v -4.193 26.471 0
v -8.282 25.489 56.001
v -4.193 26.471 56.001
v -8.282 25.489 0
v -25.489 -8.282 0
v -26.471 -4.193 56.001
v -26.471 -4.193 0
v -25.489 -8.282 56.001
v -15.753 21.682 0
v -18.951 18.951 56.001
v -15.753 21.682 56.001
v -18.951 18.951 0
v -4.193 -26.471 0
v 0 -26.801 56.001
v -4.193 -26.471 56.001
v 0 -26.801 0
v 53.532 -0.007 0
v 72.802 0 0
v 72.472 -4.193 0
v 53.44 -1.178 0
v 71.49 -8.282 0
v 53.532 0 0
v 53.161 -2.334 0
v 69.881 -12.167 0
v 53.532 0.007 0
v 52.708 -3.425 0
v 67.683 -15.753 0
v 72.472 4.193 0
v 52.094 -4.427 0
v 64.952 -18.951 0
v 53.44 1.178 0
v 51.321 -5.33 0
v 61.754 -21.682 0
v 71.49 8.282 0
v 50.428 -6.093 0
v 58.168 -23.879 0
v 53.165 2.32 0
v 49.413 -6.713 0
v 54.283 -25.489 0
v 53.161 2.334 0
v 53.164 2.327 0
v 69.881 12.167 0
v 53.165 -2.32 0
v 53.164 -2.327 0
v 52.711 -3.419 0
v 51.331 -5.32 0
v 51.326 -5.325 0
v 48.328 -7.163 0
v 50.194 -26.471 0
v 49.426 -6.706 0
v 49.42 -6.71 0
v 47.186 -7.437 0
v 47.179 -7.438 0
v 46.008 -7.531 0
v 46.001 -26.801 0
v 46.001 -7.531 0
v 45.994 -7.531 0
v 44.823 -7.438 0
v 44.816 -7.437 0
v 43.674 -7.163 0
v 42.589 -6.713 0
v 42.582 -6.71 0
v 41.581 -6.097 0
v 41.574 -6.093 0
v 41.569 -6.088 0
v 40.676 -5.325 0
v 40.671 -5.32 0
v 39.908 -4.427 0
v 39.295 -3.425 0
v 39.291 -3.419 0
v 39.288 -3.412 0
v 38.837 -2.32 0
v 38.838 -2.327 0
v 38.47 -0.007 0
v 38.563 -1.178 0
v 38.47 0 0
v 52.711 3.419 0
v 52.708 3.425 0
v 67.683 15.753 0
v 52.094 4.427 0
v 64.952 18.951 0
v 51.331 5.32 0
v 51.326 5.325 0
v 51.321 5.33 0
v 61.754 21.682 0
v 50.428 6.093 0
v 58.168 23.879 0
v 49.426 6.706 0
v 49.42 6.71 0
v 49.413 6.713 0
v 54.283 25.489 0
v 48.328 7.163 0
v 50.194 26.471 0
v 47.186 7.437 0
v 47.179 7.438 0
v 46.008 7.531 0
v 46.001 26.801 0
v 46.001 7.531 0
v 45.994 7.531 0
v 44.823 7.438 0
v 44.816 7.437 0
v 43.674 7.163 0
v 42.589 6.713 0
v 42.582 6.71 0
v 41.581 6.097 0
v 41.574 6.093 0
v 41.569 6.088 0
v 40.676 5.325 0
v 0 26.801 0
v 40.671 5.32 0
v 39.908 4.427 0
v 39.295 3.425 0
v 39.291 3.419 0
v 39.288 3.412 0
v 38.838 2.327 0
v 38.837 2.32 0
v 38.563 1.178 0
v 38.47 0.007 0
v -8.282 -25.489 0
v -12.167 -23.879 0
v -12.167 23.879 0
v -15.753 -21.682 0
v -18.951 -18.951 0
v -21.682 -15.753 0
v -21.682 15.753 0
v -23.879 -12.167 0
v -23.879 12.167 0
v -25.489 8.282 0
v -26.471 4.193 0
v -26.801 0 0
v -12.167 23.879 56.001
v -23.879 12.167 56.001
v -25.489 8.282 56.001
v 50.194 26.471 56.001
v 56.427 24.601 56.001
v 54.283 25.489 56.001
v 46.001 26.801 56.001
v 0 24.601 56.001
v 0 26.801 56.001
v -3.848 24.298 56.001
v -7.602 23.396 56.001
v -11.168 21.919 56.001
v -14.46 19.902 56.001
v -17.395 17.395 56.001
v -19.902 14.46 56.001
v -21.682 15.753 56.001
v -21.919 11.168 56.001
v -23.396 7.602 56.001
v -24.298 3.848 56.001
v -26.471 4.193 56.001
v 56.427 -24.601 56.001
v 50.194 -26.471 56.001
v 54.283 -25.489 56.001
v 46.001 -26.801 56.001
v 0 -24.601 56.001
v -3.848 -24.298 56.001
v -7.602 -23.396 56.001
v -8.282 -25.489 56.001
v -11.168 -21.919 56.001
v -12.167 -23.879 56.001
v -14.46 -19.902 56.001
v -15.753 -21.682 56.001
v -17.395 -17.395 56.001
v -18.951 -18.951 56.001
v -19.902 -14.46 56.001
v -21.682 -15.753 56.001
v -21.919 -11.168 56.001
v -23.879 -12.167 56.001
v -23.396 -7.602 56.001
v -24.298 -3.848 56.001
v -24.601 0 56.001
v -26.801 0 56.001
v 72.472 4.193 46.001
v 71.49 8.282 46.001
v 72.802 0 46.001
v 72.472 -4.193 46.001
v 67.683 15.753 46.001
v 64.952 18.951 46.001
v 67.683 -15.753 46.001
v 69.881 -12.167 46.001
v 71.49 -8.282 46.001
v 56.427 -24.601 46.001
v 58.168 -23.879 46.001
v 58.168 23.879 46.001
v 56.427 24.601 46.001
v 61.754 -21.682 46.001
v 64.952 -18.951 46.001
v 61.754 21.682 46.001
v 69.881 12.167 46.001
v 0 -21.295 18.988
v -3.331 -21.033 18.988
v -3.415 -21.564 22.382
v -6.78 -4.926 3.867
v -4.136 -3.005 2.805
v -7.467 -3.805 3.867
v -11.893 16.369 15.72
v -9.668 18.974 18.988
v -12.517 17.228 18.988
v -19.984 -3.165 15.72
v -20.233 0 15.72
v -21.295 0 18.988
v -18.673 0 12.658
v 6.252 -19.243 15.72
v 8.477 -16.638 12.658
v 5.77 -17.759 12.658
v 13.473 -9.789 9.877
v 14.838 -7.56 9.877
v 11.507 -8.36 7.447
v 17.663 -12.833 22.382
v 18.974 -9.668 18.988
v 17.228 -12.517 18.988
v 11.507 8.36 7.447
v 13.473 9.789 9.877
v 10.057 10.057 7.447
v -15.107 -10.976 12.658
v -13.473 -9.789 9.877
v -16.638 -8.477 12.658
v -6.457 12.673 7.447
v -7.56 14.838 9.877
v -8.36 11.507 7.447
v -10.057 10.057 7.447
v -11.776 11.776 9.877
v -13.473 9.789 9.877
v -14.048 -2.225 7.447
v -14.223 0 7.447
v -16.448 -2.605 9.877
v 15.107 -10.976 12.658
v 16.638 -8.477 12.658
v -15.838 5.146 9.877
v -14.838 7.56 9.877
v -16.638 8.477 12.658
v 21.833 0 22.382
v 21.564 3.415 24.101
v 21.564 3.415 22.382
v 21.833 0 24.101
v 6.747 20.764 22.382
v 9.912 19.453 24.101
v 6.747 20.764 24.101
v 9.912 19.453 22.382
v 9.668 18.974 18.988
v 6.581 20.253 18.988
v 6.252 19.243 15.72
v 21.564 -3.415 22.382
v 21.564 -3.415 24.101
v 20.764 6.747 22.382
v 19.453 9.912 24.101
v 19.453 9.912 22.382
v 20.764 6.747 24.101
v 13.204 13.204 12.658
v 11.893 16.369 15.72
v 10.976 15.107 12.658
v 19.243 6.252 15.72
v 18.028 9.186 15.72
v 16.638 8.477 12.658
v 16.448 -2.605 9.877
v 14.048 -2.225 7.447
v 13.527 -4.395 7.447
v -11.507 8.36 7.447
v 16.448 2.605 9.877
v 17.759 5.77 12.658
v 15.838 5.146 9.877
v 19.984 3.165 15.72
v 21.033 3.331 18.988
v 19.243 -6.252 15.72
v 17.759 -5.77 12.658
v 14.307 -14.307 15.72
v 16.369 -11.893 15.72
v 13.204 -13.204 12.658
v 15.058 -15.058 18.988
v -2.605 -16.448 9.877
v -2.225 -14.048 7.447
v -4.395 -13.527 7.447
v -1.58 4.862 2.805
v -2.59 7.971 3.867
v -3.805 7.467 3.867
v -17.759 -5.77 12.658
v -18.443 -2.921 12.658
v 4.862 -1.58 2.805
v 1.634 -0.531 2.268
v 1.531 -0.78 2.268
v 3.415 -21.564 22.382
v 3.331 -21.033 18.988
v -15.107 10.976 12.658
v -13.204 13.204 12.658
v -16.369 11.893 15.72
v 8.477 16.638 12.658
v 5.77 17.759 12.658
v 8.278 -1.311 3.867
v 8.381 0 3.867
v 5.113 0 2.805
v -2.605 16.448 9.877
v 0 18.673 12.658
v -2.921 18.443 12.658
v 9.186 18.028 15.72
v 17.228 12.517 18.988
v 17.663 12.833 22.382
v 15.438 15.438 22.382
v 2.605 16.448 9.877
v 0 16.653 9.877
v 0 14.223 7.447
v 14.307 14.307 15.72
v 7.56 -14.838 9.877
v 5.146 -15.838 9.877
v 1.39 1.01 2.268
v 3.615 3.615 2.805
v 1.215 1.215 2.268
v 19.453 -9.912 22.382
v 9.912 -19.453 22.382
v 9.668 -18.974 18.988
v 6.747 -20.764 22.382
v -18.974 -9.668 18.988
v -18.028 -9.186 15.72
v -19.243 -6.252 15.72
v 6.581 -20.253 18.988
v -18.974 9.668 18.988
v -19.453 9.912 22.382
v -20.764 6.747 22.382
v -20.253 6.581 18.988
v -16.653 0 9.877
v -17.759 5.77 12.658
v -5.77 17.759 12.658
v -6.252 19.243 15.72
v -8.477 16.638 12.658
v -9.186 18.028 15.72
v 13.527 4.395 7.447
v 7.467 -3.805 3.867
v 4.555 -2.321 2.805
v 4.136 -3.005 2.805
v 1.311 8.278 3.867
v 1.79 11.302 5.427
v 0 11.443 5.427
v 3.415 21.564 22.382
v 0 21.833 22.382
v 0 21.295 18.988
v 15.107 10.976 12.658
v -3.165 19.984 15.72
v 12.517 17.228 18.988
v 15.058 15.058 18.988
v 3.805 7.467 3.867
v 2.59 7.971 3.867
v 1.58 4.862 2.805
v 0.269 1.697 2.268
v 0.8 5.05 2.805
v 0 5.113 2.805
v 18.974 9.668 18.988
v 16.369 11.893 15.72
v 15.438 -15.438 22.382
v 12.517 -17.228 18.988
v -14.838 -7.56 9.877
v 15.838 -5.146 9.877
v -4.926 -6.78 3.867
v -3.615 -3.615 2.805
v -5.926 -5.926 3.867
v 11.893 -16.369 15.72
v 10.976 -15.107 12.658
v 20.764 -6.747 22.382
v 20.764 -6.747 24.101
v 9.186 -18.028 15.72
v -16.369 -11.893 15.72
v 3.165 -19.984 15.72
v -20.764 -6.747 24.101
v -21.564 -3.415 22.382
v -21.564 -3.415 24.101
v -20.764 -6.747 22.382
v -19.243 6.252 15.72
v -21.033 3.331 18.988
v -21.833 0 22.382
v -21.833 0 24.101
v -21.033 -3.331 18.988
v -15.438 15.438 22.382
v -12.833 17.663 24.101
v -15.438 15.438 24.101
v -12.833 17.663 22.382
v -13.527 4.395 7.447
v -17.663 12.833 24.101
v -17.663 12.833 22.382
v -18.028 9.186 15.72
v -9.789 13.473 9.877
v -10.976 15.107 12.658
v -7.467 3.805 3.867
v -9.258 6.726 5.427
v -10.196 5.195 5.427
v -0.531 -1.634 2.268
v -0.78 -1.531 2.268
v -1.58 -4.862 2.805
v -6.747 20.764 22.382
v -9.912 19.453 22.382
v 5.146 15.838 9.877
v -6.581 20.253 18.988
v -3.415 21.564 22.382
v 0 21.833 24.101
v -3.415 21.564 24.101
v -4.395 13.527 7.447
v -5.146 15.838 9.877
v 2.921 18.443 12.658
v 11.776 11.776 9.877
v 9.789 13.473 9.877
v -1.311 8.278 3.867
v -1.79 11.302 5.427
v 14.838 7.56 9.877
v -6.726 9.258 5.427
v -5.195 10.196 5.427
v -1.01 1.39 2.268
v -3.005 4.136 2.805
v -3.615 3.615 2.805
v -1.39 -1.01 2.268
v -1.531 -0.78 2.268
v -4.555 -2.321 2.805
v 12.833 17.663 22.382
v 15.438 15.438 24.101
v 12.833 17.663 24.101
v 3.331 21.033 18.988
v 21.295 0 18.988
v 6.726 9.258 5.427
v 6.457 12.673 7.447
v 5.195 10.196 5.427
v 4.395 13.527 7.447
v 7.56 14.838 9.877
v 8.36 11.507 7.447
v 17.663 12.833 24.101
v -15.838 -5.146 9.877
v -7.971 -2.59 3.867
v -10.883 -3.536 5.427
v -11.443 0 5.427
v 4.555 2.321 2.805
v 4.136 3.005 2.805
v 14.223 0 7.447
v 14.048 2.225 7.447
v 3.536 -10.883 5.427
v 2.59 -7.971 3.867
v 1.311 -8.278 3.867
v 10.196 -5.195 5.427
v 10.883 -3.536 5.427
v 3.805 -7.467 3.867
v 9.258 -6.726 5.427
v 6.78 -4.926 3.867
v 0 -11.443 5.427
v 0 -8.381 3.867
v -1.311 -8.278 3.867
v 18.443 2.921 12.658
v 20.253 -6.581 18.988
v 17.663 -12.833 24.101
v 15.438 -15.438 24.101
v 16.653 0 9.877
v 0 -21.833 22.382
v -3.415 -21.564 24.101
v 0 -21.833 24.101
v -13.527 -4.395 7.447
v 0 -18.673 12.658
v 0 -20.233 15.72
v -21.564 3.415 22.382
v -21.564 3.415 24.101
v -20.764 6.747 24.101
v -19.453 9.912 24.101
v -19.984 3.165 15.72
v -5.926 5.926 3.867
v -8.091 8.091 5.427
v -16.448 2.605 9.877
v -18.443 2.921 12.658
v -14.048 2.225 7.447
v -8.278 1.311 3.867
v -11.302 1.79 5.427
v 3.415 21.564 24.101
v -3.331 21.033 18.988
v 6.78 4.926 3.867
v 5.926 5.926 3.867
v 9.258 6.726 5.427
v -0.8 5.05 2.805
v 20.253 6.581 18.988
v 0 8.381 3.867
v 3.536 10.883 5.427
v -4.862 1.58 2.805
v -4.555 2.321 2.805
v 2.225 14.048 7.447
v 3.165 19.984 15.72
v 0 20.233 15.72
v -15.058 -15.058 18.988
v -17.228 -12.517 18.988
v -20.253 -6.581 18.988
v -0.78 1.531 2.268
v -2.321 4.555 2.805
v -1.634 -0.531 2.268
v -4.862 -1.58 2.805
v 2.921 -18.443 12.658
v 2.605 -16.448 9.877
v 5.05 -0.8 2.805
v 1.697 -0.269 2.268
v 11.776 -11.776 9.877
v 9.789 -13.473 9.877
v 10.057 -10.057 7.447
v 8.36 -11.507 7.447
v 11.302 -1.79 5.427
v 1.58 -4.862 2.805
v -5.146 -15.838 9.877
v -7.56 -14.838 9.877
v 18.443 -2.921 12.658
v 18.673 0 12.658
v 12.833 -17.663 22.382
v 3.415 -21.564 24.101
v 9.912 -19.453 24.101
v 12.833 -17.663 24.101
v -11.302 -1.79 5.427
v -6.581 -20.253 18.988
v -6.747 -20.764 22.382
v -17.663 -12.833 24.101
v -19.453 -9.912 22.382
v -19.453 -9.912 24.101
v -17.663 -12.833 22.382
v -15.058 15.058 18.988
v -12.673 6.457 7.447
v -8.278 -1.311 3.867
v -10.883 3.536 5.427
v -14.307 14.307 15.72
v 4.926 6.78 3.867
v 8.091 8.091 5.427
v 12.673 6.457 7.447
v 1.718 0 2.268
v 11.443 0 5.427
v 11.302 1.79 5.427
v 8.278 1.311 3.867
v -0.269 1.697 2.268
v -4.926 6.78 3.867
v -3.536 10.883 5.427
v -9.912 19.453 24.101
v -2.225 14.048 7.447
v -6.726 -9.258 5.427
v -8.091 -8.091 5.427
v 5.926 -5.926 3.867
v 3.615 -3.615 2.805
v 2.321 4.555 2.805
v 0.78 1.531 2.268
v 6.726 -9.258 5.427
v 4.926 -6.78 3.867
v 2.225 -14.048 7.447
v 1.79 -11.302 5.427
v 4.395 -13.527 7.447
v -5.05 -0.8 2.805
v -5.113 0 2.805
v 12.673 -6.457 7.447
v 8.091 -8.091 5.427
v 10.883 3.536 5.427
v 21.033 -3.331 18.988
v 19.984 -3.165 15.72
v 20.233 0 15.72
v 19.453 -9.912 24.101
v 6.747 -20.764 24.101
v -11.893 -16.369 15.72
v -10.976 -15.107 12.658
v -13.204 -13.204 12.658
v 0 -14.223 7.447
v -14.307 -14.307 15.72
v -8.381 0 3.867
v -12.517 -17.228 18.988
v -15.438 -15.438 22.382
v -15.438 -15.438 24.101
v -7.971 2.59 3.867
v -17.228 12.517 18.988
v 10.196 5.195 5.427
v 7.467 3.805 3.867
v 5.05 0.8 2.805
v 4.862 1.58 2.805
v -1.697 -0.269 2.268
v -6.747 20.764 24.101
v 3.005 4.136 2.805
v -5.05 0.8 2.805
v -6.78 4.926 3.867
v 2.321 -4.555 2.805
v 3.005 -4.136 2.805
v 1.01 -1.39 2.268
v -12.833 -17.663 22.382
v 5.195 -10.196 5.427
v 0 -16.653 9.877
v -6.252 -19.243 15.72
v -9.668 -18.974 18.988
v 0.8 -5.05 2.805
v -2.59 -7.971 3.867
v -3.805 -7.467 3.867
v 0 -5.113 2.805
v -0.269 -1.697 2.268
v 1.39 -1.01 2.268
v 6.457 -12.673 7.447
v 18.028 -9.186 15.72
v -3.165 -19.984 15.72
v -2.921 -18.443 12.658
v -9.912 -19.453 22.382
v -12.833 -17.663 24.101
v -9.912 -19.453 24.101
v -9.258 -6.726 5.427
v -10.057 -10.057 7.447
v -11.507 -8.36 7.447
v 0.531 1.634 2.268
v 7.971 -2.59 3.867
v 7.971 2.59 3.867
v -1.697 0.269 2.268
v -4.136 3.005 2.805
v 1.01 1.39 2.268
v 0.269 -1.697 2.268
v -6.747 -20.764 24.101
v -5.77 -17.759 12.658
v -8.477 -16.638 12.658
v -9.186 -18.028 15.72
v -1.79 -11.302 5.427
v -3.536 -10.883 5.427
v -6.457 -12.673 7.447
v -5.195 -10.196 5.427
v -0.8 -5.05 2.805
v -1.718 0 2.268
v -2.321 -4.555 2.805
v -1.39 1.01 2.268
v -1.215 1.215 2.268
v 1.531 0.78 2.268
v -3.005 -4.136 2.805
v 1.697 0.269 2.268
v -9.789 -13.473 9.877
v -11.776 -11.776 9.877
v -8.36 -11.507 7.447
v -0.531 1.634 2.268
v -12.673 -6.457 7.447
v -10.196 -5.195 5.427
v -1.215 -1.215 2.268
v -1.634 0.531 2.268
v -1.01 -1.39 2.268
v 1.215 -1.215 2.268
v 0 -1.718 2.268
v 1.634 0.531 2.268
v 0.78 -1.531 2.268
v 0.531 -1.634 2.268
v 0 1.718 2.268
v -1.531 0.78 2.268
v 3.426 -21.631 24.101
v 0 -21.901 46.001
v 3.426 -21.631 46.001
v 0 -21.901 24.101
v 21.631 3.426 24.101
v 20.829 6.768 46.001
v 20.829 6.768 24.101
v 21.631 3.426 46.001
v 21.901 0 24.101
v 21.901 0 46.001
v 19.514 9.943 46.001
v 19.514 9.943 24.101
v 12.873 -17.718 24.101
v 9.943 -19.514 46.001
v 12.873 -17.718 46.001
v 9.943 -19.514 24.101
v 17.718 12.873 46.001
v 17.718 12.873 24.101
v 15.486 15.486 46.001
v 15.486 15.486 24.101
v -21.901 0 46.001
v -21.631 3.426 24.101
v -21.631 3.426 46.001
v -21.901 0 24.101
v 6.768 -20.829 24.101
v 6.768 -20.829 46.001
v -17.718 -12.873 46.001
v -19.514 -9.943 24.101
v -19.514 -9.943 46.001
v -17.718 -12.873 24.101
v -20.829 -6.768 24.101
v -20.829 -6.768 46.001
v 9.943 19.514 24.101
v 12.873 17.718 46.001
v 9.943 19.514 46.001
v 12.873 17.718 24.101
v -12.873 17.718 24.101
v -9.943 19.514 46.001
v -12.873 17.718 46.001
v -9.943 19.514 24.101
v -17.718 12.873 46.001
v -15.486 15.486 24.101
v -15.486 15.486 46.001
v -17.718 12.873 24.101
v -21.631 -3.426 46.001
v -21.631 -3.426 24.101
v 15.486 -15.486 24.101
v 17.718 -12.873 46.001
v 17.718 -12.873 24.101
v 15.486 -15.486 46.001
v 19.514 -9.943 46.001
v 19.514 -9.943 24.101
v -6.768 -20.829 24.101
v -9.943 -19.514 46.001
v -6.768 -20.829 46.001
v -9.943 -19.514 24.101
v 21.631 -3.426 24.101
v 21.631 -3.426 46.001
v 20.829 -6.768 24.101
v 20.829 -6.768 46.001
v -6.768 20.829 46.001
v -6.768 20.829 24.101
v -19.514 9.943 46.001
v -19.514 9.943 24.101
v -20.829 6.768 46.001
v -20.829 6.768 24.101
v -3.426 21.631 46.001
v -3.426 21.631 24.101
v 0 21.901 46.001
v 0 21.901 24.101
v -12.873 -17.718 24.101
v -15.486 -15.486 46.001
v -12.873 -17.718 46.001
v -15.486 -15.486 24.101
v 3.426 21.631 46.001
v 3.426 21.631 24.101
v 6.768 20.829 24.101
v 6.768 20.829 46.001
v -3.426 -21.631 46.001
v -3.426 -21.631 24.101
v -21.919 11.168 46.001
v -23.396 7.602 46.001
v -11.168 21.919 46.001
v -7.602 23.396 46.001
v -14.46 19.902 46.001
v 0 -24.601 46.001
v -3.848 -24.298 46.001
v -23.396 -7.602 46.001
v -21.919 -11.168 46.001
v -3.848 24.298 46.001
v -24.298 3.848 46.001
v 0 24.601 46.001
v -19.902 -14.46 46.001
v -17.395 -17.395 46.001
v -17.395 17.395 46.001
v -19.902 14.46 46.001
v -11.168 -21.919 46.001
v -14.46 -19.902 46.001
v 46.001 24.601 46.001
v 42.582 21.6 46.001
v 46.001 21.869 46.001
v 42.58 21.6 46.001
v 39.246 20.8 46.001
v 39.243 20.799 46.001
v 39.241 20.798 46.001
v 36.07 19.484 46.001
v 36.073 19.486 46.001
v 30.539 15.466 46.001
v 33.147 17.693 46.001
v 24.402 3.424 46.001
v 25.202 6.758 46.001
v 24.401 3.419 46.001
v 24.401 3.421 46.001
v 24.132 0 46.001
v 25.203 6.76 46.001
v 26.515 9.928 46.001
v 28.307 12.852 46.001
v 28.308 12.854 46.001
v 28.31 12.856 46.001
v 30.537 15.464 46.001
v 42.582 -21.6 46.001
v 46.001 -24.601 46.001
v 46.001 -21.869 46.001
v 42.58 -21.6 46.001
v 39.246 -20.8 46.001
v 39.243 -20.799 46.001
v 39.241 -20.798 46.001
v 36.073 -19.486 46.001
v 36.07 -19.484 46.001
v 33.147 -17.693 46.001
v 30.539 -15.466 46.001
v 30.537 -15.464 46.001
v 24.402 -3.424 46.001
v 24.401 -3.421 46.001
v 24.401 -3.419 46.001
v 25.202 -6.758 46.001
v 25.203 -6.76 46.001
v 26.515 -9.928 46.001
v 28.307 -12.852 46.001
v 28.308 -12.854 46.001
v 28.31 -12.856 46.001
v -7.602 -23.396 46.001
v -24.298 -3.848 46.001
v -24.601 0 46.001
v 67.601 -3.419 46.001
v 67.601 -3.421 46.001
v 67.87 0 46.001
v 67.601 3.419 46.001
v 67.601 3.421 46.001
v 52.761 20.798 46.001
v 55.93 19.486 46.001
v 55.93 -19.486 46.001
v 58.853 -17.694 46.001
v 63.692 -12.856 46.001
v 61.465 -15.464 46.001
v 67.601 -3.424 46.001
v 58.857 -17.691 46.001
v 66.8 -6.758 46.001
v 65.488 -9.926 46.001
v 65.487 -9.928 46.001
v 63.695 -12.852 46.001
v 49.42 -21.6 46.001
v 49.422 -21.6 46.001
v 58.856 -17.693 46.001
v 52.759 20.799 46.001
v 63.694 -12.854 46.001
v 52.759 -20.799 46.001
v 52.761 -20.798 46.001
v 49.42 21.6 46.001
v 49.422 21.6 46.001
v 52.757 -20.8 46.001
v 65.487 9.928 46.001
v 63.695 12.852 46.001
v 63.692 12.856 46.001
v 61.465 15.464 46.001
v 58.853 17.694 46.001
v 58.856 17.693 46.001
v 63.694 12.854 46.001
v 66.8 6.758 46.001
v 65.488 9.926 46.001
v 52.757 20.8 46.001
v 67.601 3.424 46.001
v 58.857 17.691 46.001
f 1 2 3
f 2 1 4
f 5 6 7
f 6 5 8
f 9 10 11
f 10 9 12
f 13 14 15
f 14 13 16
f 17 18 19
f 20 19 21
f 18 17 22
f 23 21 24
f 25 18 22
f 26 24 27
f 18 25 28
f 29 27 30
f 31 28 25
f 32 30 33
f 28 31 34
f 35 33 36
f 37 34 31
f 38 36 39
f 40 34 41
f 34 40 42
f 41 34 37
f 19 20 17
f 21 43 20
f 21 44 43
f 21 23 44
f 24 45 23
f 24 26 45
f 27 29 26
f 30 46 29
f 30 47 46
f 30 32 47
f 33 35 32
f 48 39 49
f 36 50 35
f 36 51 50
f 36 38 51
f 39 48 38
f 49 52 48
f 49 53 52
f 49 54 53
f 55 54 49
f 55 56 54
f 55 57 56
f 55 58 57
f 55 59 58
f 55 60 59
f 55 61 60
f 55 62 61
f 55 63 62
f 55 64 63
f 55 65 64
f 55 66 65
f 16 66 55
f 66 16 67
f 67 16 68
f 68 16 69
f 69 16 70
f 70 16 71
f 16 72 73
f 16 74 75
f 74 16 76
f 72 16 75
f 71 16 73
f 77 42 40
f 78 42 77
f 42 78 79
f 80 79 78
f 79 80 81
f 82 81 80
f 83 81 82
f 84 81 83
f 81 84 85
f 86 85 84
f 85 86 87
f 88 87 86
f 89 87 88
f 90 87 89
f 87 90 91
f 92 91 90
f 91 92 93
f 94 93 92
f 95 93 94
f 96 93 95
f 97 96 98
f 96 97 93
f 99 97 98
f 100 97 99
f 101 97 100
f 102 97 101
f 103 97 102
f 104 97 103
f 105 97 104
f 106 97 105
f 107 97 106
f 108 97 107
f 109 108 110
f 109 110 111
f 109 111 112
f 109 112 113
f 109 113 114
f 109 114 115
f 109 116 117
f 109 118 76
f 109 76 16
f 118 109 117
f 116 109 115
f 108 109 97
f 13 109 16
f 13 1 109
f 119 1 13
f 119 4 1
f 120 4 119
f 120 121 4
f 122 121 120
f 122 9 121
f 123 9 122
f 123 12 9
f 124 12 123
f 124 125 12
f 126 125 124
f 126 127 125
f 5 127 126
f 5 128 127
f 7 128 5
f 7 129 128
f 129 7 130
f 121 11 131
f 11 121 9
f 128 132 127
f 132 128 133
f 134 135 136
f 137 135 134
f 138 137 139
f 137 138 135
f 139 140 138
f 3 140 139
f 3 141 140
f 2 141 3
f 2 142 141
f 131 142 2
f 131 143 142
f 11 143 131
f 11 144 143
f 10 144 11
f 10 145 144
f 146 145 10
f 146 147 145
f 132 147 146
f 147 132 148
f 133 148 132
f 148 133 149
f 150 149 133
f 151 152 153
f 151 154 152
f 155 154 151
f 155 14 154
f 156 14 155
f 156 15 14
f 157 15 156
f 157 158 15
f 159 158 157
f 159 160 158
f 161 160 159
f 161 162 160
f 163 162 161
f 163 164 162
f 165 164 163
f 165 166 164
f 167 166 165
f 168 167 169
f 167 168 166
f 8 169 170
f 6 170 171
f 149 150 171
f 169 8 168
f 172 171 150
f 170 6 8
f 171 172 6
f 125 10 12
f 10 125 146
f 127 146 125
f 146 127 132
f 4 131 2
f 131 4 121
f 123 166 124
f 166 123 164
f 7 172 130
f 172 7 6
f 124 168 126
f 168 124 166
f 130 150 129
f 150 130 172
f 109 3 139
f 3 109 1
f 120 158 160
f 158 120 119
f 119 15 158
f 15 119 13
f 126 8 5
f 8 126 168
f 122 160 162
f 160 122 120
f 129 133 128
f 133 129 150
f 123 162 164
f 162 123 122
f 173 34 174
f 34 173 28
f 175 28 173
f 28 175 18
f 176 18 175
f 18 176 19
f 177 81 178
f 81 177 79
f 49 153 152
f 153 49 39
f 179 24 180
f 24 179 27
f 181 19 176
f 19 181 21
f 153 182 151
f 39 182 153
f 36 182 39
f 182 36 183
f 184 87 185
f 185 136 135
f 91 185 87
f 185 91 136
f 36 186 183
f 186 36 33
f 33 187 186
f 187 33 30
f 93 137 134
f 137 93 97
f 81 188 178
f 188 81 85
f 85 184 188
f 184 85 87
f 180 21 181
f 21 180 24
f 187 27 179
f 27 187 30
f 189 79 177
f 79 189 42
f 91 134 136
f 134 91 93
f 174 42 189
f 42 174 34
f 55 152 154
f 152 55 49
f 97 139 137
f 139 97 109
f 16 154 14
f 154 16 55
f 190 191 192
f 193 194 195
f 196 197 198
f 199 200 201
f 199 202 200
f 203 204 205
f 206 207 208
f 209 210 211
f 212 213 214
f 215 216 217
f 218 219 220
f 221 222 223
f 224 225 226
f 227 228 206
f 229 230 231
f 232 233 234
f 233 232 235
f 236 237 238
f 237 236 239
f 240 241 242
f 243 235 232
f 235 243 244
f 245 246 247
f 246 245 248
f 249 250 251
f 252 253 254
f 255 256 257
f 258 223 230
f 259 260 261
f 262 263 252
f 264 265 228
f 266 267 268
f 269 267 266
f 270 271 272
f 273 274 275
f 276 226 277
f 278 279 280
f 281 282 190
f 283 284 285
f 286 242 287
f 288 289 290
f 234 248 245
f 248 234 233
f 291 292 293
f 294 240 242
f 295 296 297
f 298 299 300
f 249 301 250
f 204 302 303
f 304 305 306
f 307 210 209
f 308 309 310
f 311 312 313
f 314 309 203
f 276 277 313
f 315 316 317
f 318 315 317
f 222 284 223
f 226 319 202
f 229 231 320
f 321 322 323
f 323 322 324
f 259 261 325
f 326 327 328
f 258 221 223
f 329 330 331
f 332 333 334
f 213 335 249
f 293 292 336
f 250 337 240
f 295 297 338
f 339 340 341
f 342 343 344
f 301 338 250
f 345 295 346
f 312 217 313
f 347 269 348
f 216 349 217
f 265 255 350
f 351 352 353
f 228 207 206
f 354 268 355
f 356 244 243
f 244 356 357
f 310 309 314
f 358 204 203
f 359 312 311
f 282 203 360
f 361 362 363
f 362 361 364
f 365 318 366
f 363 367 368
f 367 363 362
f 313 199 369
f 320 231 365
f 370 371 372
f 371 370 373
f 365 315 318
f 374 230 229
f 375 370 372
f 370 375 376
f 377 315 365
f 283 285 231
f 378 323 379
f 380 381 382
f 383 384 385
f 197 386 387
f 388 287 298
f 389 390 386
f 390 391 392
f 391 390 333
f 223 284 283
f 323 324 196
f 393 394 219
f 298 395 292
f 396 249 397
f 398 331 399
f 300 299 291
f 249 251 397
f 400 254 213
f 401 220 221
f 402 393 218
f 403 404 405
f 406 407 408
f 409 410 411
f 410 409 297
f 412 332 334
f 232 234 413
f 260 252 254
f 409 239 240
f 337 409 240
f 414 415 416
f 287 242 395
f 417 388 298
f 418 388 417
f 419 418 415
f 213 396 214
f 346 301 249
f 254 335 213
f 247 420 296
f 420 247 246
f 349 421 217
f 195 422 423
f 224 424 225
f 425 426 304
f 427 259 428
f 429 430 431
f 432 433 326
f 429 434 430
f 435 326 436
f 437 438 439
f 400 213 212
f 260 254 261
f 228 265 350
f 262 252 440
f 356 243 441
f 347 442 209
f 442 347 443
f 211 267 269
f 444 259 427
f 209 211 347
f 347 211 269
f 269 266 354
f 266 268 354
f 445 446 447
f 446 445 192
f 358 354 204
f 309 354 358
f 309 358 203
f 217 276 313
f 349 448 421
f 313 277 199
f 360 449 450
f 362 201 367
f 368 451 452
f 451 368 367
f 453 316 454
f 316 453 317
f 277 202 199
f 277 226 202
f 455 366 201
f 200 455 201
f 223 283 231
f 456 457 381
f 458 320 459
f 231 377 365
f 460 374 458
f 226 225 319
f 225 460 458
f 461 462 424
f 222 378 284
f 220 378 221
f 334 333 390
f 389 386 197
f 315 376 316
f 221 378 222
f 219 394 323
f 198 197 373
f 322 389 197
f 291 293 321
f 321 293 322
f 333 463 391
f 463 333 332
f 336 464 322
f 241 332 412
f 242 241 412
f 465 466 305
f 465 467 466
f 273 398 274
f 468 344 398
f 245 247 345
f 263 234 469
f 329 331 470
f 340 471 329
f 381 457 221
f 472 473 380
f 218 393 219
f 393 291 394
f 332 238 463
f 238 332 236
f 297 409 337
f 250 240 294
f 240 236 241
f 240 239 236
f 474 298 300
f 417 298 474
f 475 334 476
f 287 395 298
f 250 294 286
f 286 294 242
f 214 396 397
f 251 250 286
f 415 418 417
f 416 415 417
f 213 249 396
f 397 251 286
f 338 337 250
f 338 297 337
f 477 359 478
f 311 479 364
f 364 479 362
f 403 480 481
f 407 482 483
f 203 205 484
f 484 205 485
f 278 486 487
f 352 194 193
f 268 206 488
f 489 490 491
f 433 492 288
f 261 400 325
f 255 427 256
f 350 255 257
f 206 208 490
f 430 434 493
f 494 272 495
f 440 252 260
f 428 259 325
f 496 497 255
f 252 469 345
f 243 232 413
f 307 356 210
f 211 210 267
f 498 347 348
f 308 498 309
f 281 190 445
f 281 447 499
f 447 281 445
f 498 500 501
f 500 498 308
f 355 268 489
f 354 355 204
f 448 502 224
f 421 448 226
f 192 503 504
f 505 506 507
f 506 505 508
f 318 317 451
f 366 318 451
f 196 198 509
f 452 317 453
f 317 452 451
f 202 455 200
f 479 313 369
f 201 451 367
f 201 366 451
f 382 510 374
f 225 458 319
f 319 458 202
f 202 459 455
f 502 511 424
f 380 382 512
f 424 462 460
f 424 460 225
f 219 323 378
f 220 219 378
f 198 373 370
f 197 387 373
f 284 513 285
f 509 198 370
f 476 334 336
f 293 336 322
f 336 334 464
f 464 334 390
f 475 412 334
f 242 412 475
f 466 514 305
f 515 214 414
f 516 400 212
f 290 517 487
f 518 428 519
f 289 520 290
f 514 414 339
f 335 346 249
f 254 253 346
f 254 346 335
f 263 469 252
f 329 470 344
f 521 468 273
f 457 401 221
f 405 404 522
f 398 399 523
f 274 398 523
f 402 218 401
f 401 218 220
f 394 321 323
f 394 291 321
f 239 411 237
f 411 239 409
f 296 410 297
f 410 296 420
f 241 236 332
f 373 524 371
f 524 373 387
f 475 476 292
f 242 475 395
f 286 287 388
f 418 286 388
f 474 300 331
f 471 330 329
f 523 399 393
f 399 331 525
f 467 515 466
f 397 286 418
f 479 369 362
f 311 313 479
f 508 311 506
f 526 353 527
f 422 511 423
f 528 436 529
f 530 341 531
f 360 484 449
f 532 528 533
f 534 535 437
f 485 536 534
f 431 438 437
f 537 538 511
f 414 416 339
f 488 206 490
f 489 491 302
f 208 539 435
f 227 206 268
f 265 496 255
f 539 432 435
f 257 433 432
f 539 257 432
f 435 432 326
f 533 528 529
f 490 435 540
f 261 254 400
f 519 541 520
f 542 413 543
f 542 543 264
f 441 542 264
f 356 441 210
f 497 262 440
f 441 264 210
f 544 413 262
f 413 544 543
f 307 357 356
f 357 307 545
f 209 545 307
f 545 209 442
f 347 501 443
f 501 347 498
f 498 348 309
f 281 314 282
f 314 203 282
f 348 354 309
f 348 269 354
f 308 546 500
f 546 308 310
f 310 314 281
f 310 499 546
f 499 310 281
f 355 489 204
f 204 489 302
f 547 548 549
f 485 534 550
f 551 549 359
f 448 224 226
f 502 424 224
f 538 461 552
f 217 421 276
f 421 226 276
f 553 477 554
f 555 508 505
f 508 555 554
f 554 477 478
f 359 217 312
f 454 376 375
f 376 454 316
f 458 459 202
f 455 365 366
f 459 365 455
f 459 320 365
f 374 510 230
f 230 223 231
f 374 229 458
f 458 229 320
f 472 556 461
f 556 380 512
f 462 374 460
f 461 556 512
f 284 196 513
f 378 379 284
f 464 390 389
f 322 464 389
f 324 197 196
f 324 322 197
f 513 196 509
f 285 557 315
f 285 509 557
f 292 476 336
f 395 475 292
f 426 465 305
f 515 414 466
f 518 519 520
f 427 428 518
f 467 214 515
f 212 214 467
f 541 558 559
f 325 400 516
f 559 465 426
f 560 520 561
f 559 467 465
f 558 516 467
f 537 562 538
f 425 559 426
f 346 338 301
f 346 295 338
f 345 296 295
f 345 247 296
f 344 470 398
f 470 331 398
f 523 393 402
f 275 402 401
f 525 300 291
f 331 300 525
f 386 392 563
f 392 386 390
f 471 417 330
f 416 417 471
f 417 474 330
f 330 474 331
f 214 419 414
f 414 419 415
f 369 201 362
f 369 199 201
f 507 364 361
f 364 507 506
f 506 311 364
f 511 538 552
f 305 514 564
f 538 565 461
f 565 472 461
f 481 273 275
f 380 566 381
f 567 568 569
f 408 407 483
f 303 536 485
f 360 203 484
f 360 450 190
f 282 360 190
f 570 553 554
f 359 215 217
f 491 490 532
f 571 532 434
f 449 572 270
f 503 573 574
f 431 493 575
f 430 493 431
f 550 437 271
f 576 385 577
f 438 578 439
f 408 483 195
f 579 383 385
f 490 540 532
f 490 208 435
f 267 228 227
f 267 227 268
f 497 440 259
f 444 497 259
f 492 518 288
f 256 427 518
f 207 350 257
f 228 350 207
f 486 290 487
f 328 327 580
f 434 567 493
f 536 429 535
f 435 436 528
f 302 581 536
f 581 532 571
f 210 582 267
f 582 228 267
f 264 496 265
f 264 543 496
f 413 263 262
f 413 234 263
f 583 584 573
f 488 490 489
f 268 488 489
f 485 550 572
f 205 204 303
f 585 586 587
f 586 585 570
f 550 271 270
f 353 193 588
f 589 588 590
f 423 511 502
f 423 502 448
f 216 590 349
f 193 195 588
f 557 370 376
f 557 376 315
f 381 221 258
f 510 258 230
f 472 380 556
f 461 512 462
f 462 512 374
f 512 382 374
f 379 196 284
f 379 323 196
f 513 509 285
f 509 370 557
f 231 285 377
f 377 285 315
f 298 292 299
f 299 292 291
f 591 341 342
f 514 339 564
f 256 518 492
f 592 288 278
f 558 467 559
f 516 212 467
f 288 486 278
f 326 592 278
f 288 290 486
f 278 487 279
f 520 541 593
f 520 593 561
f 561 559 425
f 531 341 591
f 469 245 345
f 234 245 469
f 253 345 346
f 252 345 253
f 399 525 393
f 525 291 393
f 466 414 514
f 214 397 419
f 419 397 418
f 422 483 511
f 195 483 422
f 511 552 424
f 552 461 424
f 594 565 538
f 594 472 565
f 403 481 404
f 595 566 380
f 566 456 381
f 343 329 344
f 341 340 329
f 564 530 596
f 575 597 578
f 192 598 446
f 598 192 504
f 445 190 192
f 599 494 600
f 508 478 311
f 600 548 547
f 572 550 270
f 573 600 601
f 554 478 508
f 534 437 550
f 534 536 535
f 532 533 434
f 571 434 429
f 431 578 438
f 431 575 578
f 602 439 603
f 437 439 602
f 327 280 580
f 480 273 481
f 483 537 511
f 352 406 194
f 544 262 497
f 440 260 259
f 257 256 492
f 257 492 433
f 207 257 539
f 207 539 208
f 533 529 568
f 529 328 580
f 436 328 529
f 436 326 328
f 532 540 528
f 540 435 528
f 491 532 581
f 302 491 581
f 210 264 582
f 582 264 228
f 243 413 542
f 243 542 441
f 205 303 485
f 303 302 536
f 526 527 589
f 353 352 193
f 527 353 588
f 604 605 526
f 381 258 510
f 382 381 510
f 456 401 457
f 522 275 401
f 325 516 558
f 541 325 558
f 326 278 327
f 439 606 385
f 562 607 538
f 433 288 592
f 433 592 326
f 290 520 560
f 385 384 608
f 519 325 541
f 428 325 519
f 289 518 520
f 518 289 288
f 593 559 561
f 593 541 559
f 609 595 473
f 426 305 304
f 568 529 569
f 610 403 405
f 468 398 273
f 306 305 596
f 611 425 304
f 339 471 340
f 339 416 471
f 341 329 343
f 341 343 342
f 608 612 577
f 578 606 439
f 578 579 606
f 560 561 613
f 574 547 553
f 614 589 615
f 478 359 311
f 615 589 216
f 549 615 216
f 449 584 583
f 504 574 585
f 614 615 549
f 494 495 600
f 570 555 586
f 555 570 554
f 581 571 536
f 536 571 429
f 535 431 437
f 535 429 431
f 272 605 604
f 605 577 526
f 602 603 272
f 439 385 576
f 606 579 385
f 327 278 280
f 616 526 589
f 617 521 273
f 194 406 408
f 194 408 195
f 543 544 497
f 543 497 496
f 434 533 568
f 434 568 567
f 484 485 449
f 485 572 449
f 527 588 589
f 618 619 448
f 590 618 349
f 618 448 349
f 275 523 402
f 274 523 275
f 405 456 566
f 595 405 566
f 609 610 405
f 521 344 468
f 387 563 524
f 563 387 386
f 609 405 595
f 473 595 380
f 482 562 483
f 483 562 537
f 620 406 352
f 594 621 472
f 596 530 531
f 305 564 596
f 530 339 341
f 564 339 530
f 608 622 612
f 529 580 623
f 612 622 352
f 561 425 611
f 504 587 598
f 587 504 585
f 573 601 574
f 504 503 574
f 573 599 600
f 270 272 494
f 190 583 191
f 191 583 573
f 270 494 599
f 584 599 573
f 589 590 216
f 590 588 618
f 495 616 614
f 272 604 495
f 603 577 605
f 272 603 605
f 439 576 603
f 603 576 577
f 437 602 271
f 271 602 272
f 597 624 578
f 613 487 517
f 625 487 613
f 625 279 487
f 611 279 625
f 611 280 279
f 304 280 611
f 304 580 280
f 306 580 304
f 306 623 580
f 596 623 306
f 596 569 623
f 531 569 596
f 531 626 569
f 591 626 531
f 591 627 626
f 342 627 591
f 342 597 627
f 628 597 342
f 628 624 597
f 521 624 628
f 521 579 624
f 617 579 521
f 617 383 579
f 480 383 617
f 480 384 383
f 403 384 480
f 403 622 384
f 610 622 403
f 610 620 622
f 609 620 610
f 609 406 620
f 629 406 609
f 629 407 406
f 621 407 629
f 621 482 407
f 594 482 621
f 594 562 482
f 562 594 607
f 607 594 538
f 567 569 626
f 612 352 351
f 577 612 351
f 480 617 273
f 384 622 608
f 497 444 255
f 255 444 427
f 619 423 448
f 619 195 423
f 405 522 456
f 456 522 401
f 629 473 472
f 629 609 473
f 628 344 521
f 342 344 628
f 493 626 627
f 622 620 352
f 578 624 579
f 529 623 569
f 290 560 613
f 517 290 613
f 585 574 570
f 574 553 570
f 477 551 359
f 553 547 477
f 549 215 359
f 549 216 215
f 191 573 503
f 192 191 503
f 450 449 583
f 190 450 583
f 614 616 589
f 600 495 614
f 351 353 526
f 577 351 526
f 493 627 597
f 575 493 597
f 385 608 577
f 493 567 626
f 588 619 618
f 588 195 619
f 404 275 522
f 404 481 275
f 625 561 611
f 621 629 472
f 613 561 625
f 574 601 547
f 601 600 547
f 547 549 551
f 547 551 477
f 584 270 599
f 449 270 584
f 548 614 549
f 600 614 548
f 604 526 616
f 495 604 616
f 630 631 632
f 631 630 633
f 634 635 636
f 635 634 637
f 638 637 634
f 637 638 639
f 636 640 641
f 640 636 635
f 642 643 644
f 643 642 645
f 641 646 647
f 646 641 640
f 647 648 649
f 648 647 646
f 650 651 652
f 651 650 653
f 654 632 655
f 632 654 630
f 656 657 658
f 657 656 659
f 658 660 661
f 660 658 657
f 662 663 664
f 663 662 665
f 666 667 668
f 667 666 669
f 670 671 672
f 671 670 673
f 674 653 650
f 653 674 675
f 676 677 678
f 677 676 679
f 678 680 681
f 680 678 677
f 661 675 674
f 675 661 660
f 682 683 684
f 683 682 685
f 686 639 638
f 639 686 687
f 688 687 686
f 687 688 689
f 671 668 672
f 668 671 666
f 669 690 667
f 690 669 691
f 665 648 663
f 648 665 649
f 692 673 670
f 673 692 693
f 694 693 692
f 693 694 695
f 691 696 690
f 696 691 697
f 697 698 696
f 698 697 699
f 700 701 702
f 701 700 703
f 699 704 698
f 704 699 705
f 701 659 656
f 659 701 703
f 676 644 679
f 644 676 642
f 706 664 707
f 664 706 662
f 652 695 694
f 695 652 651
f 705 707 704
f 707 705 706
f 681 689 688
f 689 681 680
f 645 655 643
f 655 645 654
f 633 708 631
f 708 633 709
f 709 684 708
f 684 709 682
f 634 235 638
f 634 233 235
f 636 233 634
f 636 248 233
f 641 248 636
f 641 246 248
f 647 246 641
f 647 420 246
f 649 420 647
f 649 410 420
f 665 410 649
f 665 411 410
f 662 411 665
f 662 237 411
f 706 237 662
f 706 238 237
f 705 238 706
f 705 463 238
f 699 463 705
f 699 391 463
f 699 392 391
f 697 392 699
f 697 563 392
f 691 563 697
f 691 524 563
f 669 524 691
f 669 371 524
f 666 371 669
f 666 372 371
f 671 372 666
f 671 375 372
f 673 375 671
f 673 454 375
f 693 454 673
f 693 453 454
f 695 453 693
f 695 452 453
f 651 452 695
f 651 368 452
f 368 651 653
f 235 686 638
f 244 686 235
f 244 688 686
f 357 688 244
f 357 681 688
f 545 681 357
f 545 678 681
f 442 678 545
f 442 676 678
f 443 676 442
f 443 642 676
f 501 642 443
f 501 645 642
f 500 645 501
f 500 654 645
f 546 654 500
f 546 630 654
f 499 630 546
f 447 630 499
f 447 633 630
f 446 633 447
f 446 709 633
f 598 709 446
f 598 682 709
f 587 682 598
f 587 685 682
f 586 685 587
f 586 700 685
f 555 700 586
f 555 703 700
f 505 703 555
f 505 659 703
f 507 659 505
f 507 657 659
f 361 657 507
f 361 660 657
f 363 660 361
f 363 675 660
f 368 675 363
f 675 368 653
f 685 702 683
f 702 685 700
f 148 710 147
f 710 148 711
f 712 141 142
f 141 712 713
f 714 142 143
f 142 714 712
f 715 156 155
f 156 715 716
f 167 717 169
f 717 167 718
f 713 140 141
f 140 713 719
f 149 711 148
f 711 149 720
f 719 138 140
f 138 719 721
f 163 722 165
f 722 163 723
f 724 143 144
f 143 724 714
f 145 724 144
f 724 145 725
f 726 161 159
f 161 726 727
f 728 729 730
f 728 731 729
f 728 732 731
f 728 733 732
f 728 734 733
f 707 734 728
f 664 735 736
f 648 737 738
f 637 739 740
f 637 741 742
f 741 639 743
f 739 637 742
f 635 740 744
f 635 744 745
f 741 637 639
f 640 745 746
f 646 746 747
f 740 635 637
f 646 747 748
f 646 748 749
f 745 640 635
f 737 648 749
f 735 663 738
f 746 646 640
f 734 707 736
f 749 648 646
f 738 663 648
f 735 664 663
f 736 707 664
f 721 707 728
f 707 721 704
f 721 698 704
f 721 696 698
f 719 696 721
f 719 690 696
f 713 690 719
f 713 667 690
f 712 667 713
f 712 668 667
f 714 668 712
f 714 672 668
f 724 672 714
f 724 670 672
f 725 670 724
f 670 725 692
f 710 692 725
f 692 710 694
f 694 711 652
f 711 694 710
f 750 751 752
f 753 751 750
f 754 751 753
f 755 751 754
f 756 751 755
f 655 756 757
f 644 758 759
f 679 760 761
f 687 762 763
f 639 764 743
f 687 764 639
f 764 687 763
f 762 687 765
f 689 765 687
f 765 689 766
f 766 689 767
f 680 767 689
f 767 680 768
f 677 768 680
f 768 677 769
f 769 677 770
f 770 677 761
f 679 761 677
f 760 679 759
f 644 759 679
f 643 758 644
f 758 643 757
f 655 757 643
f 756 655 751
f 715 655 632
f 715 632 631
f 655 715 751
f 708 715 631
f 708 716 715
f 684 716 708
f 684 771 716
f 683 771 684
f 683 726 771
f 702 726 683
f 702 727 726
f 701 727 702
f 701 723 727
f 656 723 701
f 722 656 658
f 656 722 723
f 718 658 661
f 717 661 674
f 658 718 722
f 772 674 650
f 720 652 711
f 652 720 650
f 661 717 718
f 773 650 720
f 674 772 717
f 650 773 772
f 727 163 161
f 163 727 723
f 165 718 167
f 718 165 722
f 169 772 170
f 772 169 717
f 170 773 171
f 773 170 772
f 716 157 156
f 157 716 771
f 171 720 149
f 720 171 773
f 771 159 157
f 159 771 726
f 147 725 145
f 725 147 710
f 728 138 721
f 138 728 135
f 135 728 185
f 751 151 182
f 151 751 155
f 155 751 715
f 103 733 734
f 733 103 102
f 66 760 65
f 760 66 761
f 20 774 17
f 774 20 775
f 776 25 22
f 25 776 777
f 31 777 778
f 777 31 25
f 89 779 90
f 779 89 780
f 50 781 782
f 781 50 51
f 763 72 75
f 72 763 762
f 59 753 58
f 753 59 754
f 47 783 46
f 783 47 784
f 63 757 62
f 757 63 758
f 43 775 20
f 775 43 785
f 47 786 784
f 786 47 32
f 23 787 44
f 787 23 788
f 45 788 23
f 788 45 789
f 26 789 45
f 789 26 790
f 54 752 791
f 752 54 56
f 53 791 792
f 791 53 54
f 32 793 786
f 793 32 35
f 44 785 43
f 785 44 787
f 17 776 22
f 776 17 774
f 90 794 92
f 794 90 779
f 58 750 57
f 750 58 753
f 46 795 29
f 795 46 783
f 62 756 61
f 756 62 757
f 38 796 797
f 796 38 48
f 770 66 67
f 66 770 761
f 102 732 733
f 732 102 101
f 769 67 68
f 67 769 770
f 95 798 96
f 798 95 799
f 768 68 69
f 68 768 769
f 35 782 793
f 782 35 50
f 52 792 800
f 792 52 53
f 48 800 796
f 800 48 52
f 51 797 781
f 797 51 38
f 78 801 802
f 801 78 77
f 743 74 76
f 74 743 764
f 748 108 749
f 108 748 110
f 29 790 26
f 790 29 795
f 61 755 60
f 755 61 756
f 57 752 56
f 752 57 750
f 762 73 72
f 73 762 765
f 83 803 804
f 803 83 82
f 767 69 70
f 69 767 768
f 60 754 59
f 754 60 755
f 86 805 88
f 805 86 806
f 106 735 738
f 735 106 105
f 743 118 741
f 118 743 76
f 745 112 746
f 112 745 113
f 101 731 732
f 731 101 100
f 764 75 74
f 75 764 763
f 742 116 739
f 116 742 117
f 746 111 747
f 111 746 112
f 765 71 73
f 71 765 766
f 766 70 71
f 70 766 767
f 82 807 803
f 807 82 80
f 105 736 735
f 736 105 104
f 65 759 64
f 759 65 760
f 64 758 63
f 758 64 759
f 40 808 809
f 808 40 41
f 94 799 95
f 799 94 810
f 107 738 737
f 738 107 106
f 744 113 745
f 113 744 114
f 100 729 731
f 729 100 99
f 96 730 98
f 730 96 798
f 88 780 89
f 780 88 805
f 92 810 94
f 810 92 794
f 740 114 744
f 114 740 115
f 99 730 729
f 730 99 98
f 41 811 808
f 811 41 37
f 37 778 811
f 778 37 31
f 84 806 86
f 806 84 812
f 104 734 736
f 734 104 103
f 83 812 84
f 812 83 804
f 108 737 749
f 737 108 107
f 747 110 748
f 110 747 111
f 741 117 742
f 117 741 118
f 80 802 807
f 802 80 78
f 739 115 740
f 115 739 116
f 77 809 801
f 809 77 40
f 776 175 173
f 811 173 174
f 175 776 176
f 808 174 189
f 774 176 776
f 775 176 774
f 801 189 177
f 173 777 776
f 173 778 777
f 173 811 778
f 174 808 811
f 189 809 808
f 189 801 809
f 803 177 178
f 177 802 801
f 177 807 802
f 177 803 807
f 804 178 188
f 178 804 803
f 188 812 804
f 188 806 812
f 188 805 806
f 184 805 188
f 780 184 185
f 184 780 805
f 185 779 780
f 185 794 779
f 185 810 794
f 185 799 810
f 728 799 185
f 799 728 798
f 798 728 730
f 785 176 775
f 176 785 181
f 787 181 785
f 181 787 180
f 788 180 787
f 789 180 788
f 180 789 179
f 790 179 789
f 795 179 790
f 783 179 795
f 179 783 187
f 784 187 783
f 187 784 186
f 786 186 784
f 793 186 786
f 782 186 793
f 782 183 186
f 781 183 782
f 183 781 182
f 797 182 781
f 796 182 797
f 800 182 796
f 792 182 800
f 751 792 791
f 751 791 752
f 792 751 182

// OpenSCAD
// -*- mode: SCAD ; c-file-style: "ellemtel" ; coding: utf-8 -*-
//
// Another tea portioner.
//
// The same pot, funnel and striker, and ramp principle as the first, but
// using a number of design lessons i’ve since learned, and some new ideas.
//
// © 2017 Roland Sieker <ospalh@gmail.com>
// Licence: CC-BY-SA 4.0

// … to preview. You will get both parts when you click “Create Thing”.
part = "cup"; // [cup: The portioner cup, funnel: The funnel and striker, stand: The stand to keep the cup clean]

// cm³
volume = 55;  // [8:1:150]
// Set this to “render” and click on “Create Thing” when done with the setup.
preview = 1; // [0:render, 1:preview]

// Size of the stand. Set this to 0 to just get a tray to keep the cup clean for the striking. In mm.
stand_diameter = 50;  // [0:1:100]

// Funnel diameter
funnel_diameter = 90;  // [30:1:120]

/* [Hidden] */
//
h_in_r = 1;  // Height of the cylinder in radiuses. Tweaked by hand

tau = 2 * PI;  // π is still wrong. τ = ⌀ ÷ r

w = 2.2;  // funnel &c. wall width
p = 1.2;  // height of the bottomt plate
stand_height = 15;
flange_height = 10;
stand_peg_height = 2;

chute_limit_diameter = 15;
chute_limit_factor = 0.3;

ms = 0.1;  // Muggeseggele

clearance = 0.5;  // mm for the parts that should fit into each other

funnel_angle = 60;  // °

// Somewhat comprehensible math to get r from V
// V = ½ (V sphere) + V cylinder
// V = ½ × (2τ r² × ⅓ r) + ½ τ r² × h
//
// (The V = 2τ/3 × r³ can be split in 2τr² × ⅓r: think of infinitesimal
// pyramids with the base area of the surface area of a sphere, 2τr², and
// the Volume of base area × ⅓ h, with h = r.)
// (Similarly, the area of a circle can be seen as a rectangle of
// infinitesimal circle sectors, with the outer bit alternatively at the
// top and bottom. That gives the area as r × ½ circumference, or r ×
// ½τr. No argument against τ or for π.)
//
r_cm = pow(volume/(tau/3+tau/2*h_in_r),1/3);
r = r_cm * 10;  // Volume is done in cm³, the rest of OpenSCAD uses mm.
// (And you don’t uses mm³ a.k.a. µl in everyday settings.)


r_1 = r + w;  // outer diameter, striker
r_2 = r_1 + clearance; // inner size of the measure cup flange
r_3 = r_2 + w; // outer size of themeasure cup
r_4 = r_3 + clearance;  // inner size of the stand tray
r_5 = r_4 + w;  // outer size of the stand tray

d_cc = 2*r + w;  // distance cylinder cylinder

r_cb = max(r*chute_limit_factor, chute_limit_diameter/2);
r_cb_0 = r_cb - clearance;

r_f = funnel_diameter/2;
d_ftb = r_f-r_1;
h_f = d_ftb / tan(90-funnel_angle);

some_distance = max(2*r_5,stand_diameter/2+r_3) + 10;

// fn for differently sized objects, for preview or rendering.
pfa = 40;
pfb = 25;
rfa = 180;
rfb = 90;
function fa() = (preview) ? pfa : rfa;
function fb() = (preview) ? pfb : rfb;


print_part();
// preview_parts();
// stack_parts();


module print_part()
{
   if ("cup" == part)
   {
      cup();
   }
   if (part == "funnel")
   {
      funnel();
   }
   if (part == "stand")
   {
      stand();
   }
}

module preview_parts()
{
   cup();
   translate([r_4+d_cc+funnel_diameter/2+10, 0, 0])
   {
      funnel();
   }
   translate([0, some_distance, 0])
   {
      stand();
   }
}

module stack_parts()
{
   // intersection()
   {
      color("yellow")
      {
         stand();
      }
      translate([0,0,w+2*ms])
      {
         color("red")
         {
            cup();
         }
      }
      translate([0,0,w+2*ms + r*(h_in_r + 1) + w + ms ])
      {
         color("black")
         {
            funnel();
         }
      }
   }
}



module cup()
{
   difference()
   {
      cup_body();
      cup_hollow();
   }
}


module funnel()
{
   difference()
   {
      funnel_body();
      funnel_hollow();
   }
}


module stand()
{
   difference()
   {
      union()
      {
         stand_base();
         ccc(r_5, stand_height, 0);
      }
      ccc(r_4, stand_height, p+ms);
   }
   translate([d_cc, 0, p])
   {
      cylinder(r=r_cb_0, h=stand_peg_height, $fn=fa());
   }
}

module cup_body()
{
   ccc(r_3, r*(h_in_r+1)+w+flange_height,0);
}


module cup_hollow()
{
   // Measuring hollow
   translate([0, 0, r+w])
   {
      sphere(r=r, $fn=fa());
      cylinder(r=r, h = r*h_in_r + ms, $fn=fa());
   }
   // chute
   translate([2*r+w, 0, -ms])
   {
      cylinder(r1=r_cb, r2=r, h=r*(h_in_r+1)+w + 2*ms, $fn=fa());
   }
   // funnel flange hollow
   ccc(r_2,flange_height+ms, r*(h_in_r+1)+w);
   translate([0,0,])
   {
      translate([d_cc, -r_2, r*(h_in_r+1)+w])
      {
          cube([2*r_2, 2*r_2, flange_height+ms]);
      }
   }
}


module funnel_body()
{
   cylinder(r=r_1, h=flange_height+clearance+ms, $fn=fa());
   translate([0, 0, flange_height+clearance])
   {
      cylinder(r1=r_1, r2=funnel_diameter/2+w, h=h_f, $fn=fa());
   }
}


module funnel_hollow()
{
   translate([0, 0, -ms])
   {
      cylinder(r=r, h=flange_height+clearance+3*ms, $fn=fa());

      translate([0, 0, flange_height+clearance])
      {
         cylinder(r1=r, r2=funnel_diameter/2, h=h_f+2*ms, $fn=fa());
      }
   }
}

module stand_base()
{
   translate([r+0.5*w, 0, 0])
   {
      cylinder(d=stand_diameter, h=p, $fn=fa());
      translate([0,0,p])
      {
         cylinder(d1=stand_diameter, d2=2*r_5, h=stand_height-w, $fn=fa());
      }
   }

}

module ccc(r_i, h_i, o)
{
   // The cylinder cube cylinder combo used several times
   translate([0,0, o])
   {
      cylinder(r=r_i, h=h_i, $fn=fa());
      translate([d_cc, 0, 0])
      {
         cylinder(r=r_i, h=h_i, $fn=fa());
      }
      translate([0, -r_i, 0])
      {
         cube([d_cc, 2*r_i, h_i]);
      }
   }
}
